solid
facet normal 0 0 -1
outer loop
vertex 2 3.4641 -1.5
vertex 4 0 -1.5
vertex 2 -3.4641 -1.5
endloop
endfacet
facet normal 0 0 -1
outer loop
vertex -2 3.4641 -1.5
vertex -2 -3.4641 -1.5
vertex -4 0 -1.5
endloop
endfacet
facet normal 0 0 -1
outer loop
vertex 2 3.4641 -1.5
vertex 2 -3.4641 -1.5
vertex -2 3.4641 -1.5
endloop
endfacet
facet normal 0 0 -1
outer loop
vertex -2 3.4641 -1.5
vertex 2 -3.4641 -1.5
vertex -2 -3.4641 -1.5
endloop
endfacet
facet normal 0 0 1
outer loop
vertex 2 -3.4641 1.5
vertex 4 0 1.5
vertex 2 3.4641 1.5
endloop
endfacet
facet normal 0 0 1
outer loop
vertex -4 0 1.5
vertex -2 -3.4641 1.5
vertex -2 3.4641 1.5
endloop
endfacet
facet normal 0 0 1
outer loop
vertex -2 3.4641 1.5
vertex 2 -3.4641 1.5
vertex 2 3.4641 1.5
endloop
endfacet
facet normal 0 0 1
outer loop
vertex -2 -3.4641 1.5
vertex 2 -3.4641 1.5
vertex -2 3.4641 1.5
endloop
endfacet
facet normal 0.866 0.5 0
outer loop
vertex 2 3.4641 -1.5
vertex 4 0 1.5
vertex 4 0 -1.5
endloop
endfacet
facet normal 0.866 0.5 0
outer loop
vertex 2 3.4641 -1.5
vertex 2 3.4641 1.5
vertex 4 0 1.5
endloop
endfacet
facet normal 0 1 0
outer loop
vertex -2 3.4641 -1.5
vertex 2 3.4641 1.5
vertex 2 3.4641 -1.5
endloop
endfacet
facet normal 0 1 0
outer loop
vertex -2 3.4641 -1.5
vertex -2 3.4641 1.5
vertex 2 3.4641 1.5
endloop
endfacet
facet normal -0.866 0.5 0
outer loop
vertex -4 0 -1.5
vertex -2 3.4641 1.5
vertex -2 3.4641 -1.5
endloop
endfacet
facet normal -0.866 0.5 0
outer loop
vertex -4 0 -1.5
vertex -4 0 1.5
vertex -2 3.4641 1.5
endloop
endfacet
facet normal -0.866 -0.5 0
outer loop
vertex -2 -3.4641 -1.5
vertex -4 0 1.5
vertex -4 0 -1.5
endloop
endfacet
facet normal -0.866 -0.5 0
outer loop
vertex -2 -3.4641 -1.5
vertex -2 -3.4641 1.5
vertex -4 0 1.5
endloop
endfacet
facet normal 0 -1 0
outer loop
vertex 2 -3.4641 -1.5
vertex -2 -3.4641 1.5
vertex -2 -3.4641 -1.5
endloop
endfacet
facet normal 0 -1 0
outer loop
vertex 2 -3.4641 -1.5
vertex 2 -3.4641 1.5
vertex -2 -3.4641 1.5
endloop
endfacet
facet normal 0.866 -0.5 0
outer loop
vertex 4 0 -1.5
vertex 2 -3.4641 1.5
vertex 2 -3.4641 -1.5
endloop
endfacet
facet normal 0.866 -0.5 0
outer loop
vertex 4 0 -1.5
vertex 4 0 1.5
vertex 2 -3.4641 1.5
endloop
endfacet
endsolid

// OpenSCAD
// -*-C-*-
// Model of a hexagon.
//
// Copyright 2013, Brian Davis
//
// License: LGPL 2.1 or later

// sine of 60 degrees
SIN_60=0.866025403784439;

// A 3D hexagon with height h and side length s.
//
// NOTE: the default values s=4, h=3 are for an M4 bolt.
//
// See http://www.rdwarf.com/lerickson/hex/
module hexagon(s=4, h=3) {
  A=0.5 * s;
  B=SIN_60 * s;
  C=s;

  translate([-s, -s * SIN_60, -h / 2])
    linear_extrude(height=h)
      polygon([[0, B], [A, 0],
	       [A + C, 0], [2 * C, B],
	       [A + C, 2 * B], [A, 2 * B]],
	      paths=[[0, 1, 2, 3, 4, 5]]);
}

// Test renders.
$fn=0;
$fa=0.01;
$fs=0.9;

hexagon();
